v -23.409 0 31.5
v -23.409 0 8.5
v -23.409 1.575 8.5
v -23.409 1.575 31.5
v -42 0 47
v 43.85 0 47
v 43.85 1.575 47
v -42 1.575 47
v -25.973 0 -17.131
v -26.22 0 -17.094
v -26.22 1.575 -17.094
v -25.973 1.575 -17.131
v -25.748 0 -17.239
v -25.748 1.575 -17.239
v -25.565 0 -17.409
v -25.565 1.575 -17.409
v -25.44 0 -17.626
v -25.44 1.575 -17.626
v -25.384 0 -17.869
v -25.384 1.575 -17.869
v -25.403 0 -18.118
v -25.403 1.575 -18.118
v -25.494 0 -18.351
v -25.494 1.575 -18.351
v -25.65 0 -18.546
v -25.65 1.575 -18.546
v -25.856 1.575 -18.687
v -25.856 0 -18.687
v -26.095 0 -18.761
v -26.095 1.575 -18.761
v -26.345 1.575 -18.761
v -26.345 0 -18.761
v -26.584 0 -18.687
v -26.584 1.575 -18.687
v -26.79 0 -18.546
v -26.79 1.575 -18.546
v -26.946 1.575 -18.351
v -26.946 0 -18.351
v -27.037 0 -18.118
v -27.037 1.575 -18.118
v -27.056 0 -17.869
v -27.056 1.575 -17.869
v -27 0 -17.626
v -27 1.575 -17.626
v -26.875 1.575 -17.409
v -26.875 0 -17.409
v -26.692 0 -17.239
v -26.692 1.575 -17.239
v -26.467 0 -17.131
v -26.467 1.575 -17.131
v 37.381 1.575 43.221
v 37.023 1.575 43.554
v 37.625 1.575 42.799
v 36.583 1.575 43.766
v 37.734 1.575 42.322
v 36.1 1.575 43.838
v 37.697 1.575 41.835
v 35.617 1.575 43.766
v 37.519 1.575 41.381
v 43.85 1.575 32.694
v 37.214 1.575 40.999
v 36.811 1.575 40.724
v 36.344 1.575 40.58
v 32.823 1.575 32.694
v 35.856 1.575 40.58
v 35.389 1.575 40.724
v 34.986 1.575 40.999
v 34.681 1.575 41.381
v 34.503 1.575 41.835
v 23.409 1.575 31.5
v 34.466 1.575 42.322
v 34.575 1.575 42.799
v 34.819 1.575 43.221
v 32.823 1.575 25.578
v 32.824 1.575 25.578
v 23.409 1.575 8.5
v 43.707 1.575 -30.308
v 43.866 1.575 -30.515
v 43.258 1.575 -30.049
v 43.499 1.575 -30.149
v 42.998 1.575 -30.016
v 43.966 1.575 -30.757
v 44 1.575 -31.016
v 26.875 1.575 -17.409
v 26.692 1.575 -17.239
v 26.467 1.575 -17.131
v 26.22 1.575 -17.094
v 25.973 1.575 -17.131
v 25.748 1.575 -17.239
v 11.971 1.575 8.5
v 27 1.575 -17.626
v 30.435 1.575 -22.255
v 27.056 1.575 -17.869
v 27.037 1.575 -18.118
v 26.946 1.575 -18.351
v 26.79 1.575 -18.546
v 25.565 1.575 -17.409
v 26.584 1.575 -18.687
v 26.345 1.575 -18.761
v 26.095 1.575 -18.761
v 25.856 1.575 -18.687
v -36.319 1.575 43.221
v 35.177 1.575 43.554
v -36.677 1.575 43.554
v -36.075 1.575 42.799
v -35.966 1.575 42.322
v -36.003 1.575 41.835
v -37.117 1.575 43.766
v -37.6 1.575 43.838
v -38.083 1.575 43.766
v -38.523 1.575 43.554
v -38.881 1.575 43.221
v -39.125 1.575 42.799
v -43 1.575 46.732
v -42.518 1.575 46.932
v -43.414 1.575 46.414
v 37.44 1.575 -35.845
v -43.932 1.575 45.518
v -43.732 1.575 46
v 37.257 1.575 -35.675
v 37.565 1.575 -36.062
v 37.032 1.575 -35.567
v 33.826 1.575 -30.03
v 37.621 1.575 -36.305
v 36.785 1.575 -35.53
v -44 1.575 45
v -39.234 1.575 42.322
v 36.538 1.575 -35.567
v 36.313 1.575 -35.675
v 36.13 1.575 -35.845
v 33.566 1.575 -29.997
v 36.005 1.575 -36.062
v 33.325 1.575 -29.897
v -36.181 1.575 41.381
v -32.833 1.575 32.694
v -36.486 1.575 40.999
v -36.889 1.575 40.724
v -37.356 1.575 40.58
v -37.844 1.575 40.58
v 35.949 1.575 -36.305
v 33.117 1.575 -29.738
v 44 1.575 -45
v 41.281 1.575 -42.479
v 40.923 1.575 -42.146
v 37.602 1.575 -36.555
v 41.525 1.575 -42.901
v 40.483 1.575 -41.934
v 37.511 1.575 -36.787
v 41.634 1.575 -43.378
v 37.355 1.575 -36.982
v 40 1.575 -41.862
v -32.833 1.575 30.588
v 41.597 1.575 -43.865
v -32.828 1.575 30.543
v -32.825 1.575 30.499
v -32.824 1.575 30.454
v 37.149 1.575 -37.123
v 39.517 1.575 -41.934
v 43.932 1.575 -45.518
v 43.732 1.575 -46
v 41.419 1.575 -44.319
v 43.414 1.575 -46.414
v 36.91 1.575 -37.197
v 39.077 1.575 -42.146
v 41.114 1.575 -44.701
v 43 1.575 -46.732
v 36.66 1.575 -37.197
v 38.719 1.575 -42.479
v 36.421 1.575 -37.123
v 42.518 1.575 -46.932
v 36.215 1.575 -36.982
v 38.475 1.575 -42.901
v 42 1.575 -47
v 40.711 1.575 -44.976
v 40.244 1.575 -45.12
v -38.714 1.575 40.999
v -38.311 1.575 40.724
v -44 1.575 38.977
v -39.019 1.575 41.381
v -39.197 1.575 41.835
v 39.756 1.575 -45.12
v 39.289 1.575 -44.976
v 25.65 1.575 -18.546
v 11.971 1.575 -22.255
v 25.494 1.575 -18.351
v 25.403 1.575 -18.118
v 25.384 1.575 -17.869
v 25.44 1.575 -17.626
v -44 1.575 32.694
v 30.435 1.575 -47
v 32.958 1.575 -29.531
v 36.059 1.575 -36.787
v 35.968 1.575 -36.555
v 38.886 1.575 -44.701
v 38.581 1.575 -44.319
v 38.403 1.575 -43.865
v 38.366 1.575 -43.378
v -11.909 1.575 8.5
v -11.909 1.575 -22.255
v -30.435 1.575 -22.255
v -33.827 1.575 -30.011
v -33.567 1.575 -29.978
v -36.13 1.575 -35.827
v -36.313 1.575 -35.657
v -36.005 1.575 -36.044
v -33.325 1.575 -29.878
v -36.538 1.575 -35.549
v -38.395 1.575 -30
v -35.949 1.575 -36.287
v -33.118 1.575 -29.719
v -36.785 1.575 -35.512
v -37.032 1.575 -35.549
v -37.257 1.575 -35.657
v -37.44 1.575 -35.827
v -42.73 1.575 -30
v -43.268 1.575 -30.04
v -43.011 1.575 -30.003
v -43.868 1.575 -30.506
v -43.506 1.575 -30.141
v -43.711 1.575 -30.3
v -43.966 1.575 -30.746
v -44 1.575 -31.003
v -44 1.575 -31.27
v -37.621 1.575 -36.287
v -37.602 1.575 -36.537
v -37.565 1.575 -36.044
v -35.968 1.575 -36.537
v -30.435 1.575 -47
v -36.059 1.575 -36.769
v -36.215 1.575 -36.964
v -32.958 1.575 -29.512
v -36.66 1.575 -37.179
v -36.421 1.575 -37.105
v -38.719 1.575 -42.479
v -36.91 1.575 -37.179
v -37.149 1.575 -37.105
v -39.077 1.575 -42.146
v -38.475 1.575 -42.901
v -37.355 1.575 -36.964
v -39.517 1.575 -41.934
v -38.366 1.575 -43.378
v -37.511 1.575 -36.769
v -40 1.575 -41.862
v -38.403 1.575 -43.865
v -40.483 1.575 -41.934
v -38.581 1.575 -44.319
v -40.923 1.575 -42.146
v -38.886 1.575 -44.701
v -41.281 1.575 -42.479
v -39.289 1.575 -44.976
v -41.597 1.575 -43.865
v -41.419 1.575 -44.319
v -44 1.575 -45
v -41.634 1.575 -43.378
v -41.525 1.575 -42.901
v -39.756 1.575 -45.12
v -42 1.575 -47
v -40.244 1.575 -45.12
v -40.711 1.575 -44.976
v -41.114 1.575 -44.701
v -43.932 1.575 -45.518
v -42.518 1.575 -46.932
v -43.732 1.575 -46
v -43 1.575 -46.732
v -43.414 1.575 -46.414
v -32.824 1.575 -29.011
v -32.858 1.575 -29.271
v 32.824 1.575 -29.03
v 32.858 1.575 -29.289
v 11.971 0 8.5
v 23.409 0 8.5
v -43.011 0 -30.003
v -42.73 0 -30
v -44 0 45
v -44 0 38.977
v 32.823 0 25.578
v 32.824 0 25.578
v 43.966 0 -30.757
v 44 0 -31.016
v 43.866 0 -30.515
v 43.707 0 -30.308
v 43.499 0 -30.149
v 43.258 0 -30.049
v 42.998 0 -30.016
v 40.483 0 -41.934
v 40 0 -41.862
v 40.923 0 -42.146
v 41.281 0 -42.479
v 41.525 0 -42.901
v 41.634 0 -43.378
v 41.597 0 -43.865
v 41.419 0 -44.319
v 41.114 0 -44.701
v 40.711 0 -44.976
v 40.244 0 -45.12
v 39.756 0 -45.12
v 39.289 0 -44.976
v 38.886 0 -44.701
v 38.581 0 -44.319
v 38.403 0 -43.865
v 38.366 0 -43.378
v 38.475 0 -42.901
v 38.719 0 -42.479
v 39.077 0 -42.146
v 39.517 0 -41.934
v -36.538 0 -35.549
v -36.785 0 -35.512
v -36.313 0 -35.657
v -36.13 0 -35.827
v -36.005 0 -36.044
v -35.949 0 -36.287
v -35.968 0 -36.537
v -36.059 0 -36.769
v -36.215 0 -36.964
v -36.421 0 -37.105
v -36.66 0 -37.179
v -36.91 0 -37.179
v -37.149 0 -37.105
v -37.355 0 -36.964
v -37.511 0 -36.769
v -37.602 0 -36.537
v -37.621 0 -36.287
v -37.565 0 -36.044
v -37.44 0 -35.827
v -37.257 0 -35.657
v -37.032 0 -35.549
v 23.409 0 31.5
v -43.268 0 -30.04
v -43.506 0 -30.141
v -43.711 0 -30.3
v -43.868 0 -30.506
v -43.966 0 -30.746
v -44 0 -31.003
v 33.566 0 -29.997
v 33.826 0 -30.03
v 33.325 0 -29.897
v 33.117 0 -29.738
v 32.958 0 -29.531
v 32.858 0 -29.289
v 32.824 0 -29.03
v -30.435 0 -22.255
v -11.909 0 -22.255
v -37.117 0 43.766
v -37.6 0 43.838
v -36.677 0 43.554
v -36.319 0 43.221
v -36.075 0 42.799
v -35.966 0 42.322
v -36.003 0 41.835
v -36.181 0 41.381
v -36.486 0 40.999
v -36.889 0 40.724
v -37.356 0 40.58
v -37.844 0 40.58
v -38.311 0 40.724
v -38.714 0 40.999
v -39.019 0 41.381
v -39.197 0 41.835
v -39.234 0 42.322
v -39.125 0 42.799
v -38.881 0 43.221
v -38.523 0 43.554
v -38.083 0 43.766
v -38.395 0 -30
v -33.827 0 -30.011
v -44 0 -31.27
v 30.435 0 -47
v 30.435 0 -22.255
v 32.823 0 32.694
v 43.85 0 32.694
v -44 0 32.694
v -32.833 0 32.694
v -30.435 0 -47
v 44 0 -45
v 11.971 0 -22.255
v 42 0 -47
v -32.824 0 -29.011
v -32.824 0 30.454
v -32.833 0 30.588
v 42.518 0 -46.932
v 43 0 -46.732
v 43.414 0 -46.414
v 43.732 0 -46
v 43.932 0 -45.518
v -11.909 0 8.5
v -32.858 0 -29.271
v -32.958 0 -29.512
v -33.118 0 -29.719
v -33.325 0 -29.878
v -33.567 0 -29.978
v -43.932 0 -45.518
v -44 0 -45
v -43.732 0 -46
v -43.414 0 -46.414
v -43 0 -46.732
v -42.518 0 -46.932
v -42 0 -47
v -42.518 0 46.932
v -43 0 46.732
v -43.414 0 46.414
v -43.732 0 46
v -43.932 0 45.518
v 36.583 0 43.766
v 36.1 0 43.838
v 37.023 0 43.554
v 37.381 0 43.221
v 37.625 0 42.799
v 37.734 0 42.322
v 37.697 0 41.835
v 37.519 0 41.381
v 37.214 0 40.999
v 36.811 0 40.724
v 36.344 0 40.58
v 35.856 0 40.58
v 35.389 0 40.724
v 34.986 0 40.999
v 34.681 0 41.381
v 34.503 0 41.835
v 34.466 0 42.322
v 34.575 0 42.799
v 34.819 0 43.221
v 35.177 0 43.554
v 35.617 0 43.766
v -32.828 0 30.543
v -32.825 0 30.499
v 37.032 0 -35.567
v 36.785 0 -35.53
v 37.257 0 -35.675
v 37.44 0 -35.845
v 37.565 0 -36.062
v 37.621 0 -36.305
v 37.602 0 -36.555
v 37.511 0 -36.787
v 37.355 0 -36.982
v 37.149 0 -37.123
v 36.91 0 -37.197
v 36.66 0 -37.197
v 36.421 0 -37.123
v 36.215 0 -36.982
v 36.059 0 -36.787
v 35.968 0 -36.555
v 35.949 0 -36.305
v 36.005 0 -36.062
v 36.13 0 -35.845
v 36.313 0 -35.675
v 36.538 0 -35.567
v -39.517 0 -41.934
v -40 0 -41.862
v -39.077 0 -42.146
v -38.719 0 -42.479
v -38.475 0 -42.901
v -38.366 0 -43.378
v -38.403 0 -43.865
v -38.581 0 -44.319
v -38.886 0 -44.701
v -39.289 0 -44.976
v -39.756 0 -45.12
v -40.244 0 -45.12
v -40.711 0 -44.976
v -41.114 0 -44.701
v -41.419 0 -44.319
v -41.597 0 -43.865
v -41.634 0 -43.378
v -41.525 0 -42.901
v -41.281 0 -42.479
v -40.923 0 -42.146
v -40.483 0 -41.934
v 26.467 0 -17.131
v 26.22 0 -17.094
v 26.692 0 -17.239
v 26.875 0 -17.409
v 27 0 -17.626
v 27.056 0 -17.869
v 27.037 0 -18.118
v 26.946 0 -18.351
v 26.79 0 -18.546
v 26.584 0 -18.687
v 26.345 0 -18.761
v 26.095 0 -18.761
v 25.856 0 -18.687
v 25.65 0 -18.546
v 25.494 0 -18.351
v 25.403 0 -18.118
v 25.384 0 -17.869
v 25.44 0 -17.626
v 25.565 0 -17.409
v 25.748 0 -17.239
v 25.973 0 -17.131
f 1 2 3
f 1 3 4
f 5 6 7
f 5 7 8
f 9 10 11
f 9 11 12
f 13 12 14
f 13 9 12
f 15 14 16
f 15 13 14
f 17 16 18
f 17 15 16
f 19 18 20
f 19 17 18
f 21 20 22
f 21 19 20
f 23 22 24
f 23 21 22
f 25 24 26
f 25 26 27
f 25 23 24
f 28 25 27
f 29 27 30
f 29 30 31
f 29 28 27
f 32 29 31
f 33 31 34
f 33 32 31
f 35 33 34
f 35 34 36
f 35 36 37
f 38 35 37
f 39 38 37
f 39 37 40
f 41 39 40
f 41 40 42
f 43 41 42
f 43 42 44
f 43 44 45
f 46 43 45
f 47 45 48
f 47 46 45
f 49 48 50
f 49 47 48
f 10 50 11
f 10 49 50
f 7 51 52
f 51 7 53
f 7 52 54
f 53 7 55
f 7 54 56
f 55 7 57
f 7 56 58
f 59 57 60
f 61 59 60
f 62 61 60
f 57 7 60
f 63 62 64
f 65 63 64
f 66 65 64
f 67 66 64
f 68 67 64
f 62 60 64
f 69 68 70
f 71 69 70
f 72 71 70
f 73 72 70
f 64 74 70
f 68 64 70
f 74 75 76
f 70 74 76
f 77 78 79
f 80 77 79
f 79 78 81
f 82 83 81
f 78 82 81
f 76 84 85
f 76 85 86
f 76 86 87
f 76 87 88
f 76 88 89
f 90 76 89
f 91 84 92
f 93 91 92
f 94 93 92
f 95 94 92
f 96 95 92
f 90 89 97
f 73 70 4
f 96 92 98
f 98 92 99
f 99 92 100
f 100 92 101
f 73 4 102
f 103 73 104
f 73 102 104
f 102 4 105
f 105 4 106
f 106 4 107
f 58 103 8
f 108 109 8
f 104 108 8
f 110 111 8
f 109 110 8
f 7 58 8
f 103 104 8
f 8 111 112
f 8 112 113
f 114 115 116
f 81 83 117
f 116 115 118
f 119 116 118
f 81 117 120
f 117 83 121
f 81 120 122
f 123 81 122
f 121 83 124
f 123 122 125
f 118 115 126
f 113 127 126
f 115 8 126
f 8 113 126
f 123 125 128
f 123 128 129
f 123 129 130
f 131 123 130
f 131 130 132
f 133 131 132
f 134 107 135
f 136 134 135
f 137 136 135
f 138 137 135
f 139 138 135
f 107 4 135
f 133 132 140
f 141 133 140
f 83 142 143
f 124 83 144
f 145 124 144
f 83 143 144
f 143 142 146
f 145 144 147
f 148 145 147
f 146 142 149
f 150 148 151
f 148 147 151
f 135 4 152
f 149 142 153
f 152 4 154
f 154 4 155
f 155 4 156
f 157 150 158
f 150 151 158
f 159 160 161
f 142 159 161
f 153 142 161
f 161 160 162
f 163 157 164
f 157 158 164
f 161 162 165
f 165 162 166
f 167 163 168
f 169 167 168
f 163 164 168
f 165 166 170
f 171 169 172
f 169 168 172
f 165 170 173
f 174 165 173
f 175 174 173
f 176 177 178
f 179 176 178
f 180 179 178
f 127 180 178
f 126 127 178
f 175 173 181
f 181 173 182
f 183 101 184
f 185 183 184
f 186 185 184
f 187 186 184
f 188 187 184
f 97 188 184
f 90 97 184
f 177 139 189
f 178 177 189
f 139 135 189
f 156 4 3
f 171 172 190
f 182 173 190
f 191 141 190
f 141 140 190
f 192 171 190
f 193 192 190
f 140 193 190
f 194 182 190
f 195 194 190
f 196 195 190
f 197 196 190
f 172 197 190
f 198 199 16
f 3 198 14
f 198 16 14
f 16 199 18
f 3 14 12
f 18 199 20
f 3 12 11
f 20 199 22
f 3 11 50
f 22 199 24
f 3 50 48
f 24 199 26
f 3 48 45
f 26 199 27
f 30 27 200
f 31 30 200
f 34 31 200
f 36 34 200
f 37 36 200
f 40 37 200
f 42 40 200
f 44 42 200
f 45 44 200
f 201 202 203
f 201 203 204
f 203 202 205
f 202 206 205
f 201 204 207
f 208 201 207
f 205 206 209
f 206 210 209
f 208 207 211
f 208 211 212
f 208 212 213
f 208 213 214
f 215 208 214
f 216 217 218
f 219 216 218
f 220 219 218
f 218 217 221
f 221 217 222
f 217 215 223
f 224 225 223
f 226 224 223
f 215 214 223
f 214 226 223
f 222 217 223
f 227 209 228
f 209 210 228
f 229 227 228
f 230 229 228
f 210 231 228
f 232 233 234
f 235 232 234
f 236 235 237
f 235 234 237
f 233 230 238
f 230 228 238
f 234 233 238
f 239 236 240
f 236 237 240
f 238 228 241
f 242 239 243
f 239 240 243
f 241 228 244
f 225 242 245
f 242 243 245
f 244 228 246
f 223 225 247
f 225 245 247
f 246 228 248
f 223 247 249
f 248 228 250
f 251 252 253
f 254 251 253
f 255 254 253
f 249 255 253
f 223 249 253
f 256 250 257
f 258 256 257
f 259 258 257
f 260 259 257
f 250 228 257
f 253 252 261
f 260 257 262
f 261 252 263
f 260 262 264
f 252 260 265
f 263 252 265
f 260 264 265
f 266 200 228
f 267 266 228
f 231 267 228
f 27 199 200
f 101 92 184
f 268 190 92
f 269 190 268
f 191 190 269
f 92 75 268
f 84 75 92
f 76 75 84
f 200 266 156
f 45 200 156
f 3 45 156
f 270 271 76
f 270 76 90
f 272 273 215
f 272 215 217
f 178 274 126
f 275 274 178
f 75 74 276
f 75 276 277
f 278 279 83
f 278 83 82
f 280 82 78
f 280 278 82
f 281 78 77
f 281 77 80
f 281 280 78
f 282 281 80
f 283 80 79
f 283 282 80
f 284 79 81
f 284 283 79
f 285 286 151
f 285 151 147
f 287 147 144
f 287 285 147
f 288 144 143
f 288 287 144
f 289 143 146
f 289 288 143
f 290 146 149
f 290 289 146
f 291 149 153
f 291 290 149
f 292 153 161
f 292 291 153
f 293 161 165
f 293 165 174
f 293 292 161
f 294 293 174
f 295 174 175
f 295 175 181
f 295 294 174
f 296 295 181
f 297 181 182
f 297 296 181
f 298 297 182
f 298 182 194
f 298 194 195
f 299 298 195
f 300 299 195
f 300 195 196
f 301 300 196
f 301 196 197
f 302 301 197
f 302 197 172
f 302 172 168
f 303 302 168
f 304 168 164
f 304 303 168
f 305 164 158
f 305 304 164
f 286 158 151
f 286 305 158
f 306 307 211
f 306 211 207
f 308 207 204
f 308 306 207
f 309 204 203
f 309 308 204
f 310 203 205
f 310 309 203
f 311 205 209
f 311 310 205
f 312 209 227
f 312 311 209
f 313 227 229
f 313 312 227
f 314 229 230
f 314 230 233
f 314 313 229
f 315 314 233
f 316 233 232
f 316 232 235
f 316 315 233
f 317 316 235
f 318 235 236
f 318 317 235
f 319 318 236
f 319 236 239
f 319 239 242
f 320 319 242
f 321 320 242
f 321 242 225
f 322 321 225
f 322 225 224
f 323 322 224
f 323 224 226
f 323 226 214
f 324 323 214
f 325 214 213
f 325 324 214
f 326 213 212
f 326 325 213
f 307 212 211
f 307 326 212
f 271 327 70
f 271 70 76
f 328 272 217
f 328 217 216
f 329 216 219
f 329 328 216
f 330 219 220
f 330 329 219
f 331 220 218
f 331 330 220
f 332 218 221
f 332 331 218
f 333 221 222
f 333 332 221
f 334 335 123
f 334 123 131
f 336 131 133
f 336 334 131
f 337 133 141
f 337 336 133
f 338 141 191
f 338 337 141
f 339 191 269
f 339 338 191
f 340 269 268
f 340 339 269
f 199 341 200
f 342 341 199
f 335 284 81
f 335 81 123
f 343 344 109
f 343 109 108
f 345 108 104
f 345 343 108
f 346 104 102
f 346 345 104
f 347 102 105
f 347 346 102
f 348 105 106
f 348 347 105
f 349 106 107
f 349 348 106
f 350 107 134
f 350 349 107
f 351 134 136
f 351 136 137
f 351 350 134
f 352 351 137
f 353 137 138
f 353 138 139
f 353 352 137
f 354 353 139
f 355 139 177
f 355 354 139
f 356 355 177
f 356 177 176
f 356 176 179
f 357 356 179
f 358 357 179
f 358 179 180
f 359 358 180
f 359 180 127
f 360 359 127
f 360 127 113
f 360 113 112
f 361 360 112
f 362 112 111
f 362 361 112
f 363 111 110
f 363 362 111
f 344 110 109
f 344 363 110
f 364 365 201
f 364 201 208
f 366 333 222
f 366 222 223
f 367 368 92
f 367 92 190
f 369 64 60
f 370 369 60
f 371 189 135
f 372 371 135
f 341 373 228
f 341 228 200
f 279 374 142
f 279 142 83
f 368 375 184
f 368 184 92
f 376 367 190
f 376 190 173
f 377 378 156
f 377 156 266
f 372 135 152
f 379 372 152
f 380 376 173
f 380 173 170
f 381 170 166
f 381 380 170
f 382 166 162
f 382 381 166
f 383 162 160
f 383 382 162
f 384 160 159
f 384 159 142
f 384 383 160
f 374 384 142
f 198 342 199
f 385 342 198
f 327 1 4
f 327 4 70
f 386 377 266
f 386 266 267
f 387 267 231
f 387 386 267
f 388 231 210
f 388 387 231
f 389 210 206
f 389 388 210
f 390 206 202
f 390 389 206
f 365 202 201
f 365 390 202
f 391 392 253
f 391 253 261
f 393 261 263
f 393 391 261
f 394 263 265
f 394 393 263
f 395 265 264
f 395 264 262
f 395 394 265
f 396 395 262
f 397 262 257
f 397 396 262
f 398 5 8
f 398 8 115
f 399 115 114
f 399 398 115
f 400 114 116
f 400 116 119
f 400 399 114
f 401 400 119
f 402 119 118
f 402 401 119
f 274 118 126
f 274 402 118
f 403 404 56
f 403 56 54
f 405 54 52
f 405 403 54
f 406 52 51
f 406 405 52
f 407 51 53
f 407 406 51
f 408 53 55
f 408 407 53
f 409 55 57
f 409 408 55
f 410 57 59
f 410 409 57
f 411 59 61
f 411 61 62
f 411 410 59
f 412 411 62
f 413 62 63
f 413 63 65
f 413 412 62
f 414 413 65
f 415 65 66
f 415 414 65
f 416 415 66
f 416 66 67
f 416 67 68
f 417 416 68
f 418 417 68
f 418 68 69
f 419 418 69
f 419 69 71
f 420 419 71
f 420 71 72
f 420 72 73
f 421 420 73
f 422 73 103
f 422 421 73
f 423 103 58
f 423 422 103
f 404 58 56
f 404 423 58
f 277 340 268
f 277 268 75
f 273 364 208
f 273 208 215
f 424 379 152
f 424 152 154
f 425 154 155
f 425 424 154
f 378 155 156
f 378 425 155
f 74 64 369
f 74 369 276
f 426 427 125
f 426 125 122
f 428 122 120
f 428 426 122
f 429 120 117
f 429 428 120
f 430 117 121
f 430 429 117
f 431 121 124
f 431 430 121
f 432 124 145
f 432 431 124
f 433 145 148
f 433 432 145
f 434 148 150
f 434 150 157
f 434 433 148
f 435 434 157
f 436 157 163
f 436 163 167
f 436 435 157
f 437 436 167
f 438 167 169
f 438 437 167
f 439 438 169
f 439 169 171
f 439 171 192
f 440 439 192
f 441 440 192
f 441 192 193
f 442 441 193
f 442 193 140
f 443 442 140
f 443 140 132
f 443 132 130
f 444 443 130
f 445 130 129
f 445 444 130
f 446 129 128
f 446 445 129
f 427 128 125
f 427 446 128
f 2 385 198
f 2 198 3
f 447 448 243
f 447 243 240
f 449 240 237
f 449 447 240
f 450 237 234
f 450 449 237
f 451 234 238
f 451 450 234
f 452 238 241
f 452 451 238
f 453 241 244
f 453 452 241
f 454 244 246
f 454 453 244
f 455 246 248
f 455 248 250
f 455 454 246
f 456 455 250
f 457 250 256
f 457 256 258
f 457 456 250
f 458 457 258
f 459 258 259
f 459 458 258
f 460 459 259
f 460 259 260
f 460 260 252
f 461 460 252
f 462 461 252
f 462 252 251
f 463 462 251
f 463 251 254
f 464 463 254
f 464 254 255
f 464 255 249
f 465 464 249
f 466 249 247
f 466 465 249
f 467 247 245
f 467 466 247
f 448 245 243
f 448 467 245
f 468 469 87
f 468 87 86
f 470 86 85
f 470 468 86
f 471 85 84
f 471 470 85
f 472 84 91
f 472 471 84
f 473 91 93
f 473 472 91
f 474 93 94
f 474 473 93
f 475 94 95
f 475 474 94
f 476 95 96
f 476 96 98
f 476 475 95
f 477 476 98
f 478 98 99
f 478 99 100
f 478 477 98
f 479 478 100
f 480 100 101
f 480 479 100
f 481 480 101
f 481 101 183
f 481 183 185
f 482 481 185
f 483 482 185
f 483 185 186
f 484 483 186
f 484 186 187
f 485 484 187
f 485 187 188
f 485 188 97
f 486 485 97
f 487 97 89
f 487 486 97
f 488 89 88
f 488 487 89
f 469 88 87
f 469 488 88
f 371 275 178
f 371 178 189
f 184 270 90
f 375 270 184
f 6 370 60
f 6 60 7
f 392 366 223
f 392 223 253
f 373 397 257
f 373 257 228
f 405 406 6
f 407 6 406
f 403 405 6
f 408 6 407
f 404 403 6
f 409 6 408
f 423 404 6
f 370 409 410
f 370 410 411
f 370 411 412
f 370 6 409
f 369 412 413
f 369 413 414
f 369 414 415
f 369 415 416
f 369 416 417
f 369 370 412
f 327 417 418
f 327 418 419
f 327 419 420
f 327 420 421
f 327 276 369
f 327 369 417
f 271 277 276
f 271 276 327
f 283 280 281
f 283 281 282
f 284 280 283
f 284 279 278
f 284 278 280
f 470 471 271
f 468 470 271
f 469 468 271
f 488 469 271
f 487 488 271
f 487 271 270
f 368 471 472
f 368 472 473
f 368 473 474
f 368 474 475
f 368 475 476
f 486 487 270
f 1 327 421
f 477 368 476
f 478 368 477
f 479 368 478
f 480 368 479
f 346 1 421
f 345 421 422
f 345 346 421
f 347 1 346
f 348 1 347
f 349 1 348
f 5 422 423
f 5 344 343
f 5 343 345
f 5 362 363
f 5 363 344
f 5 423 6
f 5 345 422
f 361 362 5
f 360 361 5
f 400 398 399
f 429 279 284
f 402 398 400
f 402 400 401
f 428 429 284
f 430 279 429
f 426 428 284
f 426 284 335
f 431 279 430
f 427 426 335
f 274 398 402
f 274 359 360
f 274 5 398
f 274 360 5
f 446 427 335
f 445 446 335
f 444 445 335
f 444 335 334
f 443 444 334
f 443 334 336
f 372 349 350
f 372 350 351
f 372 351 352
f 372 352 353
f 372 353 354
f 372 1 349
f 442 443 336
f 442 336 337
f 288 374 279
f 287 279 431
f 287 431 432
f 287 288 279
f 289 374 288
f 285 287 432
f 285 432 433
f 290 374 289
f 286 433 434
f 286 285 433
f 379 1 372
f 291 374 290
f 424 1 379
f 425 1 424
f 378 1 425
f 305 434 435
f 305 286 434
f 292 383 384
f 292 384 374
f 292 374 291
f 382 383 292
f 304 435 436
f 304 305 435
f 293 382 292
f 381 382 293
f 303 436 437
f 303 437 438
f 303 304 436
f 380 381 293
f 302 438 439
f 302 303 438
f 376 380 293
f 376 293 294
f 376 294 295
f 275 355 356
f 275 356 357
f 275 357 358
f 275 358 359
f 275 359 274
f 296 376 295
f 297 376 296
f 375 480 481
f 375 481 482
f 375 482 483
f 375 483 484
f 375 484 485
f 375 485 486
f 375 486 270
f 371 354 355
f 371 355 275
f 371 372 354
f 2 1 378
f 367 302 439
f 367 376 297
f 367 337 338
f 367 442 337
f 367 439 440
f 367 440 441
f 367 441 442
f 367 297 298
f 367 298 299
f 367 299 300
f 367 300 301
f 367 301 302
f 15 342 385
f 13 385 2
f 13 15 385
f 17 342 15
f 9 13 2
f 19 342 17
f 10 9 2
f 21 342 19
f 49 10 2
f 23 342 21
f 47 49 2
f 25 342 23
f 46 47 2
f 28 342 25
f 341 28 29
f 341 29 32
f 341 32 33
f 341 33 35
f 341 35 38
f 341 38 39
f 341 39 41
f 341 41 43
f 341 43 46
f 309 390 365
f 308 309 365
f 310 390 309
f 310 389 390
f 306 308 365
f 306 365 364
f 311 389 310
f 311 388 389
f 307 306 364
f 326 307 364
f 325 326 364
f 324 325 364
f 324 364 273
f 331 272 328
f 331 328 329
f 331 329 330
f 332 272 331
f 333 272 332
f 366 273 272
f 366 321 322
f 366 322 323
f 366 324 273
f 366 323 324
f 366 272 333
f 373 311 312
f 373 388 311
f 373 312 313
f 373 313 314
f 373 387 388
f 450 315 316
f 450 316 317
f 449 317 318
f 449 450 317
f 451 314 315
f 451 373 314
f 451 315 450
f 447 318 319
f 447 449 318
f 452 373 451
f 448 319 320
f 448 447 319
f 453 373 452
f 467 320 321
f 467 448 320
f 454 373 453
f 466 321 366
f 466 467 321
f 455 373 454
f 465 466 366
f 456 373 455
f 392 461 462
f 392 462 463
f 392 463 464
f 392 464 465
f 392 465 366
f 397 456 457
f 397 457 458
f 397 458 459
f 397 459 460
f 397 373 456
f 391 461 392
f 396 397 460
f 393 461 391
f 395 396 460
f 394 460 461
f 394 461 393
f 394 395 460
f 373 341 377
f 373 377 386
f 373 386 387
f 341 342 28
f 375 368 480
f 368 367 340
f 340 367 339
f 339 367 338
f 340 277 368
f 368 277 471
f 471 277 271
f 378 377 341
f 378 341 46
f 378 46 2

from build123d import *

# Parameters (mm, degrees)
SKETCH1_2_R         = 1.6383
SKETCH1_2_R_2       = 0.8382
BOSS_EXTRUDE2_DEPTH = 1.575
SKETCH2_W           = 14.080651801
SKETCH2_H           = 7.11628052
SKETCH2_W_2         = 15.007196354
SKETCH2_H_2         = 9.421332762
CUT_EXTRUDE1_DEPTH  = 65.400942629


with BuildPart() as part:
    # Sketch1<2> → Boss-Extrude2 (new body)
    with BuildSketch(Plane(origin=(0, 0, 0), x_dir=(1, 0, 0), z_dir=(0, 1, 0))):
        with BuildLine():
            Line((-38.39500299, 29.999999735), (-42.73000299, 29.999999735))
            Line((-42.73000299, 29.999999735), (-43.011025994, 30.003097626))
            ThreePointArc((-43.011025994, 30.003097626), (-43.710996344, 30.299838092), (-44.000003042, 31.003036872))
            Line((-44.000003042, 31.003036872), (-44.000003042, 31.269999735))
            Line((-44.000003042, 31.269999735), (-44.000005679, 44.999999735))
            ThreePointArc((-44.000005679, 44.999999735), (-43.414218633, 46.414215608), (-42.000002924, 47.000003051))
            Line((-42.000002924, 47.000003051), (-30.435003, 47.000003051))
            Line((-30.435003, 47.000003051), (-30.435003, 22.255357341))
            Line((-30.435003, 22.255357341), (-11.909003, 22.255357341))
            Line((-11.909003, 22.255357341), (-11.909003, -8.5))
            Line((-11.909003, -8.5), (-23.409003, -8.5))
            Line((-23.409003, -8.5), (-23.409003, -31.499996949))
            Line((-23.409003, -31.499996949), (23.408997, -31.499996949))
            Line((23.408997, -31.499996949), (23.408997, -8.499997555))
            Line((23.408997, -8.499997555), (11.97084713, -8.499997555))
            Line((11.97084713, -8.499997555), (11.97084713, 22.255357341))
            Line((11.97084713, 22.255357341), (30.434997, 22.255357341))
            Line((30.434997, 22.255357341), (30.434997, 47.000003051))
            Line((30.434997, 47.000003051), (42.000008541, 47.000003051))
            ThreePointArc((42.000008541, 47.000003051), (43.414213215, 46.414220704), (43.999996956, 45.000016607))
            Line((43.999996956, 45.000016607), (43.999996956, 32.000003378))
            Line((43.999996956, 32.000003378), (43.999996956, 31.015615364))
            ThreePointArc((43.999996956, 31.015615364), (43.706534093, 30.307939396), (42.998386406, 30.015616661))
            Line((42.998386406, 30.015616661), (33.825607551, 30.030389905))
            ThreePointArc((33.825607551, 30.030389905), (33.117459864, 29.738067169), (32.823997, 29.030391202))
            Line((32.823997, 29.030391202), (32.823997, -30.453996949))
            ThreePointArc((32.823997, -30.453996949), (33.116890219, -31.16110373), (33.823997, -31.453996949))
            Line((33.823997, -31.453996949), (36.099999555, -31.453996949))
            Line((36.099999555, -31.453996949), (42.849728118, -31.453996949))
            ThreePointArc((42.849728118, -31.453996949), (43.556834899, -31.746890168), (43.849728118, -32.453996949))
            Line((43.849728118, -32.453996949), (43.849728118, -36.999996949))
            Line((43.849728118, -36.999996949), (43.849728118, -46.999996949))
            Line((43.849728118, -46.999996949), (-42.000000178, -46.999996949))
            ThreePointArc((-42.000000178, -46.999996949), (-43.414212804, -46.414211581), (-44.000000499, -44.999999921))
            Line((-44.000000499, -44.999999921), (-44.000000178, -38.976999921))
            Line((-44.000000178, -38.976999921), (-44.000000178, -32.453999802))
            ThreePointArc((-44.000000178, -32.453999802), (-43.70710696, -31.746893021), (-43.000000178, -31.453999802))
            Line((-43.000000178, -31.453999802), (-36.100000549, -31.453999802))
            Line((-36.100000549, -31.453999802), (-33.824003042, -31.453999802))
            ThreePointArc((-33.824003042, -31.453999802), (-33.116896261, -31.161106583), (-32.824003042, -30.453999802))
            Line((-32.824003042, -30.453999802), (-32.824003042, 29.011483943))
            ThreePointArc((-32.824003042, 29.011483943), (-33.117785331, 29.719478678), (-33.826516131, 30.011480785))
            Line((-33.826516131, 30.011480785), (-38.39500299, 29.999999735))
        make_face()
        with Locations((40, 43.5)):
            Circle(SKETCH1_2_R, mode=Mode.SUBTRACT)
        with Locations((-40, 43.5)):
            Circle(SKETCH1_2_R, mode=Mode.SUBTRACT)
        with Locations((-37.6, -42.2)):
            Circle(SKETCH1_2_R, mode=Mode.SUBTRACT)
        with Locations((36.1, -42.2)):
            Circle(SKETCH1_2_R, mode=Mode.SUBTRACT)
        with Locations((-36.785003, 36.350003051)):
            Circle(SKETCH1_2_R_2, mode=Mode.SUBTRACT)
        with Locations((-26.220003, 17.93193176)):
            Circle(SKETCH1_2_R_2, mode=Mode.SUBTRACT)
        with Locations((26.219997, 17.93193176)):
            Circle(SKETCH1_2_R_2, mode=Mode.SUBTRACT)
        with Locations((36.784997, 36.368003051)):
            Circle(SKETCH1_2_R_2, mode=Mode.SUBTRACT)
    extrude(amount=BOSS_EXTRUDE2_DEPTH)

    # Sketch2 → Cut-Extrude1 (cut, through all)
    with BuildSketch(Plane(origin=(0, 1.575, 0), x_dir=(1, 0, 0), z_dir=(0, 1, 0))):
        with Locations((39.863054019, -29.135856689)):
            Rectangle(SKETCH2_W, SKETCH2_H)
        with Locations((-40.336598676, -27.983330568)):
            Rectangle(SKETCH2_W_2, SKETCH2_H_2)
    extrude(amount=-CUT_EXTRUDE1_DEPTH, mode=Mode.SUBTRACT)


solid = part.part
